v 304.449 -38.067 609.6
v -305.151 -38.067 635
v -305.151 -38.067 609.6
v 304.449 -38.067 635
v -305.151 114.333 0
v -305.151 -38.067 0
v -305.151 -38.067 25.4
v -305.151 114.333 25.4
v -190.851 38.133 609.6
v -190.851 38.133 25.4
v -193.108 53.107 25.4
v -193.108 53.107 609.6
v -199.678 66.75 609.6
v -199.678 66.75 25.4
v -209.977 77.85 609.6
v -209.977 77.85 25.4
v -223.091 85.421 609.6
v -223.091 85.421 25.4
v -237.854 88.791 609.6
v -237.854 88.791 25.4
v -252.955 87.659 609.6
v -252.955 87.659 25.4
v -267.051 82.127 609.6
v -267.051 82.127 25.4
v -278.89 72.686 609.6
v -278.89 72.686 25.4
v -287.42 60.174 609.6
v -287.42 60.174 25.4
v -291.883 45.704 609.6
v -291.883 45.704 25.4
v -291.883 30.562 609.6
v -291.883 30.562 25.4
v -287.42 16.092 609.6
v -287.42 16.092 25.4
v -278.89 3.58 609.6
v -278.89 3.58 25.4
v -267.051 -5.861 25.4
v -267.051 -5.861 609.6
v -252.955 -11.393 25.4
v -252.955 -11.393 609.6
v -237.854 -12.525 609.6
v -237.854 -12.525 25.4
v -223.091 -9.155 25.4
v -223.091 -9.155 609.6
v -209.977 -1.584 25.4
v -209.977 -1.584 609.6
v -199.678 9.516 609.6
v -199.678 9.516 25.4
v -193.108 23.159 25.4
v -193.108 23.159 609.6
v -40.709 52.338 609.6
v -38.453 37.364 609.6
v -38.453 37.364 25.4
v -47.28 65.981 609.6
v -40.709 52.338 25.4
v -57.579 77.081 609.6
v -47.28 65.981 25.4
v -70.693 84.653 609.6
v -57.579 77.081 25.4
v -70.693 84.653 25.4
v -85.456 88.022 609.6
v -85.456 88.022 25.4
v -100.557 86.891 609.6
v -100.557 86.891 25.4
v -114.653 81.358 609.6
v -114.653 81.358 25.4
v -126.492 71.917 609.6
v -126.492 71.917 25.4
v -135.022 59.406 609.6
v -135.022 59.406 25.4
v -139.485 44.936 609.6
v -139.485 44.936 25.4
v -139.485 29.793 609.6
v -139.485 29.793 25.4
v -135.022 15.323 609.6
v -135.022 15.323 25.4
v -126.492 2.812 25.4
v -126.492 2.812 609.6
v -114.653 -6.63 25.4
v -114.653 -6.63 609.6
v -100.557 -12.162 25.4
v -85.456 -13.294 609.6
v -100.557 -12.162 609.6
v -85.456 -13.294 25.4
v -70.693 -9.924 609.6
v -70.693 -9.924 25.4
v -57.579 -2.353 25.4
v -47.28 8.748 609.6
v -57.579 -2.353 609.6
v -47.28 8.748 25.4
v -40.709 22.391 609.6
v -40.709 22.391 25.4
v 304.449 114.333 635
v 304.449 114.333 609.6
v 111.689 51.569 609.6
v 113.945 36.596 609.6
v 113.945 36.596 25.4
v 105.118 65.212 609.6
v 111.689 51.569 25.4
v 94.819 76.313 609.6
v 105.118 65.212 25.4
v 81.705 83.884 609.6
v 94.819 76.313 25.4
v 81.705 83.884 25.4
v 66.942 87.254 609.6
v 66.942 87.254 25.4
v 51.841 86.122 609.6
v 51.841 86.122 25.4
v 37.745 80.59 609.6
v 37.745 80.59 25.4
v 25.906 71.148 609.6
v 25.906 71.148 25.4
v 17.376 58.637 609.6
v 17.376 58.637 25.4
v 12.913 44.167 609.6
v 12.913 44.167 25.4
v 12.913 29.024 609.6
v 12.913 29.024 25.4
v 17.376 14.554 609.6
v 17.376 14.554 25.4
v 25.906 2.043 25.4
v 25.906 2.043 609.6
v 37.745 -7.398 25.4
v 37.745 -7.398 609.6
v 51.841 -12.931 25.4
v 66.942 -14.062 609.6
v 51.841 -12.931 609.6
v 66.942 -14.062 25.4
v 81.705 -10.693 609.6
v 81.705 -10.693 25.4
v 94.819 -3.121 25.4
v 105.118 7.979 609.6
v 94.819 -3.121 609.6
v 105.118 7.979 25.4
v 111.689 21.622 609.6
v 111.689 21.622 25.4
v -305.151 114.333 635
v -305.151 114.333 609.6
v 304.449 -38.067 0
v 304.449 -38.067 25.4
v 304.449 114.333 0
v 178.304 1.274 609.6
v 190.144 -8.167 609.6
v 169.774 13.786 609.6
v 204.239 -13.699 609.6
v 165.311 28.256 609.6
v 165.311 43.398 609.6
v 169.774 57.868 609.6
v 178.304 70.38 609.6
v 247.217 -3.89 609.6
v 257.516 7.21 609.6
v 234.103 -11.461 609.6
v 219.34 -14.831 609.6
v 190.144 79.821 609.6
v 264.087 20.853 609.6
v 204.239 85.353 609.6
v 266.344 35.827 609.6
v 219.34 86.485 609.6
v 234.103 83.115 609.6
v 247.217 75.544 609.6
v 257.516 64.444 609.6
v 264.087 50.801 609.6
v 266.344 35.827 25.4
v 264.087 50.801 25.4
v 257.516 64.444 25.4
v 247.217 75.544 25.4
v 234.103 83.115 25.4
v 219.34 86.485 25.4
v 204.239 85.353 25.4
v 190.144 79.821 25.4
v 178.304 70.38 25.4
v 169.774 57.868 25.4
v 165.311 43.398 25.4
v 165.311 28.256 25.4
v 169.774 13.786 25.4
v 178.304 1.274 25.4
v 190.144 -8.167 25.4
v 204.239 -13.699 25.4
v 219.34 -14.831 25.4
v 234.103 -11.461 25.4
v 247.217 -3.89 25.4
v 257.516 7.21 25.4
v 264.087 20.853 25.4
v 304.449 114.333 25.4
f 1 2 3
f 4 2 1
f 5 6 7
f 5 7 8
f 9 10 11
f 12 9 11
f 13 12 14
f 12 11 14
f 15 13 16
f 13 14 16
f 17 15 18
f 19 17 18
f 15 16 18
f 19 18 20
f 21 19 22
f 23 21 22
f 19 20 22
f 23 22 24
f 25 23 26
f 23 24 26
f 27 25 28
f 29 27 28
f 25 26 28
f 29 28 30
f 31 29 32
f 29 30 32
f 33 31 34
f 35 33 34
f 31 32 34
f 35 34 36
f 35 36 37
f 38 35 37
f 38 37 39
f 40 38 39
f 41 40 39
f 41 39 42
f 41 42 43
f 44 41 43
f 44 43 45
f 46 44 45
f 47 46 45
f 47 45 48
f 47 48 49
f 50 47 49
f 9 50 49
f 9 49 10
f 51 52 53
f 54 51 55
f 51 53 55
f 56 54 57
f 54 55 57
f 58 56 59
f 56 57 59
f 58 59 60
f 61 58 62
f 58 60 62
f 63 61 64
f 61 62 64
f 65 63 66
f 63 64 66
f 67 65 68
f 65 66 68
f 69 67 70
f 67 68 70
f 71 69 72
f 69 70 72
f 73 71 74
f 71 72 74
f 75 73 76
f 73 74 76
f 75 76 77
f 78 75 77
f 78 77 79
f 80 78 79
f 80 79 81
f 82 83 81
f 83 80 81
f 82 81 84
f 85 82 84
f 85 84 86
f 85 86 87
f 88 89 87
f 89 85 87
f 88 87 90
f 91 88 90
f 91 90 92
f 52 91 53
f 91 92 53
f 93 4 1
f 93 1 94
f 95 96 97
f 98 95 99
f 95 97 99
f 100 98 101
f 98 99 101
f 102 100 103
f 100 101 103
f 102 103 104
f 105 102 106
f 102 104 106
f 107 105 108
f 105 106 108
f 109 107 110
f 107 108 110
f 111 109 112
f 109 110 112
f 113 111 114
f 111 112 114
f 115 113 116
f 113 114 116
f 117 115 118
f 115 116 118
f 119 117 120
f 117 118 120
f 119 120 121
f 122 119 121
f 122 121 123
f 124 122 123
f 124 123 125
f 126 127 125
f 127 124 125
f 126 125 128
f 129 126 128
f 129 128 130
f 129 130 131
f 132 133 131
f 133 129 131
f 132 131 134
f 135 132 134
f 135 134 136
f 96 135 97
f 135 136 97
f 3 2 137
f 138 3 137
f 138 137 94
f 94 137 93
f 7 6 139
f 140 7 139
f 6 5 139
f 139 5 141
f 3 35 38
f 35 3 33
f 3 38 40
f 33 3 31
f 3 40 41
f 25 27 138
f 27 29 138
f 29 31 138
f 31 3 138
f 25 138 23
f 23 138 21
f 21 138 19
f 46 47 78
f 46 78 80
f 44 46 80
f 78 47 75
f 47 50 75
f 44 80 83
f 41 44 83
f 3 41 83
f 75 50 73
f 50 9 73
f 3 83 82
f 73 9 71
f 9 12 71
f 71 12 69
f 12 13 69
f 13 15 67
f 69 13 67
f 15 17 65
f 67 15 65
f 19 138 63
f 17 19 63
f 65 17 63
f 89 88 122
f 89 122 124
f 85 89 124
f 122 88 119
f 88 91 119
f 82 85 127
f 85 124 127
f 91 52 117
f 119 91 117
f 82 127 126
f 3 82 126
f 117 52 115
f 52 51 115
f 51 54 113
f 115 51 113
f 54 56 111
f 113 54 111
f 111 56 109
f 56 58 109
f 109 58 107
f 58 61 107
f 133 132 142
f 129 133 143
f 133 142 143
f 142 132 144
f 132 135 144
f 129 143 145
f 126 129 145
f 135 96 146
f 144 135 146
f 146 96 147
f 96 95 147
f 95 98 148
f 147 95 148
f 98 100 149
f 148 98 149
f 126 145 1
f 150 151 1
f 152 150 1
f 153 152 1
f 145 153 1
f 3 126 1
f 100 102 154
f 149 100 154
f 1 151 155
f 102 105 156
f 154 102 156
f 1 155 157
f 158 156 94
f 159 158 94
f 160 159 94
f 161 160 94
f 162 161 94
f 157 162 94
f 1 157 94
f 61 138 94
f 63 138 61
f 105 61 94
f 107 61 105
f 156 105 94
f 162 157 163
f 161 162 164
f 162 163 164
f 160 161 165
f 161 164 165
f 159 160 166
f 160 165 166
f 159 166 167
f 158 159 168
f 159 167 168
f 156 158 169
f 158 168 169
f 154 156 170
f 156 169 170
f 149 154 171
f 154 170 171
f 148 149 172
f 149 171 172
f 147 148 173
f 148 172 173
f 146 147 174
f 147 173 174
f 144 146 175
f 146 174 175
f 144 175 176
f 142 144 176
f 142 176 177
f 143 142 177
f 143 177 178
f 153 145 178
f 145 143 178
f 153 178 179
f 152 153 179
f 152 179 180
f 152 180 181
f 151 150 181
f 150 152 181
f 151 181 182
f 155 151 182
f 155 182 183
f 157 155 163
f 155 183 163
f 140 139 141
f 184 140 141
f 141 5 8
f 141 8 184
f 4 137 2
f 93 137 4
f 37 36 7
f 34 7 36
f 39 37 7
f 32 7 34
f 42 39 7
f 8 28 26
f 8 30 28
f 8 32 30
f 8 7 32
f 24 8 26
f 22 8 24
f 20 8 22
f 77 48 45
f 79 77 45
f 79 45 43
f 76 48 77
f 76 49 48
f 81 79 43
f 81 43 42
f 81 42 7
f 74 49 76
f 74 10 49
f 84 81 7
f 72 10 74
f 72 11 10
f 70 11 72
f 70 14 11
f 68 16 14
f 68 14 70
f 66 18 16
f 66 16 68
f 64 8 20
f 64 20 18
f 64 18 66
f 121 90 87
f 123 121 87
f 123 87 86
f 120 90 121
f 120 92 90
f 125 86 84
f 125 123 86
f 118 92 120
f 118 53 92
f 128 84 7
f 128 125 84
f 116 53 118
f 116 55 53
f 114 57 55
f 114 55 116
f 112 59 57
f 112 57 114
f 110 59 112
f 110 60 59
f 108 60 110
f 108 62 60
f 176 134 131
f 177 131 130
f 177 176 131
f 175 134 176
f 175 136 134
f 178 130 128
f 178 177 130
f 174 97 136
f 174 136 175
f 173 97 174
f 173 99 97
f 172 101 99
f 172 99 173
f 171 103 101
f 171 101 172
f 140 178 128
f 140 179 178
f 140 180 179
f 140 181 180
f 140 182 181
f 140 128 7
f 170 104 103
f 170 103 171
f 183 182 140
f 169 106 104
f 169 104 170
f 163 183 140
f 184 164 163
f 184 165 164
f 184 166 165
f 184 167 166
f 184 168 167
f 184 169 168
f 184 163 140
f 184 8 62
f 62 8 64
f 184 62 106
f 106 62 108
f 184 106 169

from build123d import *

# Parameters (mm, degrees)
F0_W     = 609.6
F0_H     = 152.4
F1_DEPTH = 25.4
F2_R     = 50.8
F3_DEPTH = 609.6
F4_W     = 609.6
F4_H     = 152.4
F4_R     = 50.8
F5_DEPTH = 25.4


with BuildPart() as f1:
    # F0 (on Top) → F1 (new body)
    with BuildSketch(Plane.XY):
        with Locations((-0.350654, 38.133061)):
            Rectangle(F0_W, F0_H)
    extrude(amount=F1_DEPTH)

    # F2 (on face) → F3 (join)
    with BuildSketch(Plane.XY.offset(25.4)):
        with Locations((215.54353, 35.826997)):
            Circle(F2_R)
        with Locations((63.145469, 36.595685)):
            Circle(F2_R)
        with Locations((-89.252593, 37.364373)):
            Circle(F2_R)
        with Locations((-241.650654, 38.133061)):
            Circle(F2_R)
    extrude(amount=F3_DEPTH)

    # F4 (on face) → F5 (join)
    with BuildSketch(Plane.XY.offset(635)):
        with Locations((-0.350654, 38.133061)):
            Rectangle(F4_W, F4_H)
        with Locations((-241.650654, 38.133061)):
            Circle(F4_R, mode=Mode.SUBTRACT)
    extrude(amount=-F5_DEPTH)


solid = f1.part
